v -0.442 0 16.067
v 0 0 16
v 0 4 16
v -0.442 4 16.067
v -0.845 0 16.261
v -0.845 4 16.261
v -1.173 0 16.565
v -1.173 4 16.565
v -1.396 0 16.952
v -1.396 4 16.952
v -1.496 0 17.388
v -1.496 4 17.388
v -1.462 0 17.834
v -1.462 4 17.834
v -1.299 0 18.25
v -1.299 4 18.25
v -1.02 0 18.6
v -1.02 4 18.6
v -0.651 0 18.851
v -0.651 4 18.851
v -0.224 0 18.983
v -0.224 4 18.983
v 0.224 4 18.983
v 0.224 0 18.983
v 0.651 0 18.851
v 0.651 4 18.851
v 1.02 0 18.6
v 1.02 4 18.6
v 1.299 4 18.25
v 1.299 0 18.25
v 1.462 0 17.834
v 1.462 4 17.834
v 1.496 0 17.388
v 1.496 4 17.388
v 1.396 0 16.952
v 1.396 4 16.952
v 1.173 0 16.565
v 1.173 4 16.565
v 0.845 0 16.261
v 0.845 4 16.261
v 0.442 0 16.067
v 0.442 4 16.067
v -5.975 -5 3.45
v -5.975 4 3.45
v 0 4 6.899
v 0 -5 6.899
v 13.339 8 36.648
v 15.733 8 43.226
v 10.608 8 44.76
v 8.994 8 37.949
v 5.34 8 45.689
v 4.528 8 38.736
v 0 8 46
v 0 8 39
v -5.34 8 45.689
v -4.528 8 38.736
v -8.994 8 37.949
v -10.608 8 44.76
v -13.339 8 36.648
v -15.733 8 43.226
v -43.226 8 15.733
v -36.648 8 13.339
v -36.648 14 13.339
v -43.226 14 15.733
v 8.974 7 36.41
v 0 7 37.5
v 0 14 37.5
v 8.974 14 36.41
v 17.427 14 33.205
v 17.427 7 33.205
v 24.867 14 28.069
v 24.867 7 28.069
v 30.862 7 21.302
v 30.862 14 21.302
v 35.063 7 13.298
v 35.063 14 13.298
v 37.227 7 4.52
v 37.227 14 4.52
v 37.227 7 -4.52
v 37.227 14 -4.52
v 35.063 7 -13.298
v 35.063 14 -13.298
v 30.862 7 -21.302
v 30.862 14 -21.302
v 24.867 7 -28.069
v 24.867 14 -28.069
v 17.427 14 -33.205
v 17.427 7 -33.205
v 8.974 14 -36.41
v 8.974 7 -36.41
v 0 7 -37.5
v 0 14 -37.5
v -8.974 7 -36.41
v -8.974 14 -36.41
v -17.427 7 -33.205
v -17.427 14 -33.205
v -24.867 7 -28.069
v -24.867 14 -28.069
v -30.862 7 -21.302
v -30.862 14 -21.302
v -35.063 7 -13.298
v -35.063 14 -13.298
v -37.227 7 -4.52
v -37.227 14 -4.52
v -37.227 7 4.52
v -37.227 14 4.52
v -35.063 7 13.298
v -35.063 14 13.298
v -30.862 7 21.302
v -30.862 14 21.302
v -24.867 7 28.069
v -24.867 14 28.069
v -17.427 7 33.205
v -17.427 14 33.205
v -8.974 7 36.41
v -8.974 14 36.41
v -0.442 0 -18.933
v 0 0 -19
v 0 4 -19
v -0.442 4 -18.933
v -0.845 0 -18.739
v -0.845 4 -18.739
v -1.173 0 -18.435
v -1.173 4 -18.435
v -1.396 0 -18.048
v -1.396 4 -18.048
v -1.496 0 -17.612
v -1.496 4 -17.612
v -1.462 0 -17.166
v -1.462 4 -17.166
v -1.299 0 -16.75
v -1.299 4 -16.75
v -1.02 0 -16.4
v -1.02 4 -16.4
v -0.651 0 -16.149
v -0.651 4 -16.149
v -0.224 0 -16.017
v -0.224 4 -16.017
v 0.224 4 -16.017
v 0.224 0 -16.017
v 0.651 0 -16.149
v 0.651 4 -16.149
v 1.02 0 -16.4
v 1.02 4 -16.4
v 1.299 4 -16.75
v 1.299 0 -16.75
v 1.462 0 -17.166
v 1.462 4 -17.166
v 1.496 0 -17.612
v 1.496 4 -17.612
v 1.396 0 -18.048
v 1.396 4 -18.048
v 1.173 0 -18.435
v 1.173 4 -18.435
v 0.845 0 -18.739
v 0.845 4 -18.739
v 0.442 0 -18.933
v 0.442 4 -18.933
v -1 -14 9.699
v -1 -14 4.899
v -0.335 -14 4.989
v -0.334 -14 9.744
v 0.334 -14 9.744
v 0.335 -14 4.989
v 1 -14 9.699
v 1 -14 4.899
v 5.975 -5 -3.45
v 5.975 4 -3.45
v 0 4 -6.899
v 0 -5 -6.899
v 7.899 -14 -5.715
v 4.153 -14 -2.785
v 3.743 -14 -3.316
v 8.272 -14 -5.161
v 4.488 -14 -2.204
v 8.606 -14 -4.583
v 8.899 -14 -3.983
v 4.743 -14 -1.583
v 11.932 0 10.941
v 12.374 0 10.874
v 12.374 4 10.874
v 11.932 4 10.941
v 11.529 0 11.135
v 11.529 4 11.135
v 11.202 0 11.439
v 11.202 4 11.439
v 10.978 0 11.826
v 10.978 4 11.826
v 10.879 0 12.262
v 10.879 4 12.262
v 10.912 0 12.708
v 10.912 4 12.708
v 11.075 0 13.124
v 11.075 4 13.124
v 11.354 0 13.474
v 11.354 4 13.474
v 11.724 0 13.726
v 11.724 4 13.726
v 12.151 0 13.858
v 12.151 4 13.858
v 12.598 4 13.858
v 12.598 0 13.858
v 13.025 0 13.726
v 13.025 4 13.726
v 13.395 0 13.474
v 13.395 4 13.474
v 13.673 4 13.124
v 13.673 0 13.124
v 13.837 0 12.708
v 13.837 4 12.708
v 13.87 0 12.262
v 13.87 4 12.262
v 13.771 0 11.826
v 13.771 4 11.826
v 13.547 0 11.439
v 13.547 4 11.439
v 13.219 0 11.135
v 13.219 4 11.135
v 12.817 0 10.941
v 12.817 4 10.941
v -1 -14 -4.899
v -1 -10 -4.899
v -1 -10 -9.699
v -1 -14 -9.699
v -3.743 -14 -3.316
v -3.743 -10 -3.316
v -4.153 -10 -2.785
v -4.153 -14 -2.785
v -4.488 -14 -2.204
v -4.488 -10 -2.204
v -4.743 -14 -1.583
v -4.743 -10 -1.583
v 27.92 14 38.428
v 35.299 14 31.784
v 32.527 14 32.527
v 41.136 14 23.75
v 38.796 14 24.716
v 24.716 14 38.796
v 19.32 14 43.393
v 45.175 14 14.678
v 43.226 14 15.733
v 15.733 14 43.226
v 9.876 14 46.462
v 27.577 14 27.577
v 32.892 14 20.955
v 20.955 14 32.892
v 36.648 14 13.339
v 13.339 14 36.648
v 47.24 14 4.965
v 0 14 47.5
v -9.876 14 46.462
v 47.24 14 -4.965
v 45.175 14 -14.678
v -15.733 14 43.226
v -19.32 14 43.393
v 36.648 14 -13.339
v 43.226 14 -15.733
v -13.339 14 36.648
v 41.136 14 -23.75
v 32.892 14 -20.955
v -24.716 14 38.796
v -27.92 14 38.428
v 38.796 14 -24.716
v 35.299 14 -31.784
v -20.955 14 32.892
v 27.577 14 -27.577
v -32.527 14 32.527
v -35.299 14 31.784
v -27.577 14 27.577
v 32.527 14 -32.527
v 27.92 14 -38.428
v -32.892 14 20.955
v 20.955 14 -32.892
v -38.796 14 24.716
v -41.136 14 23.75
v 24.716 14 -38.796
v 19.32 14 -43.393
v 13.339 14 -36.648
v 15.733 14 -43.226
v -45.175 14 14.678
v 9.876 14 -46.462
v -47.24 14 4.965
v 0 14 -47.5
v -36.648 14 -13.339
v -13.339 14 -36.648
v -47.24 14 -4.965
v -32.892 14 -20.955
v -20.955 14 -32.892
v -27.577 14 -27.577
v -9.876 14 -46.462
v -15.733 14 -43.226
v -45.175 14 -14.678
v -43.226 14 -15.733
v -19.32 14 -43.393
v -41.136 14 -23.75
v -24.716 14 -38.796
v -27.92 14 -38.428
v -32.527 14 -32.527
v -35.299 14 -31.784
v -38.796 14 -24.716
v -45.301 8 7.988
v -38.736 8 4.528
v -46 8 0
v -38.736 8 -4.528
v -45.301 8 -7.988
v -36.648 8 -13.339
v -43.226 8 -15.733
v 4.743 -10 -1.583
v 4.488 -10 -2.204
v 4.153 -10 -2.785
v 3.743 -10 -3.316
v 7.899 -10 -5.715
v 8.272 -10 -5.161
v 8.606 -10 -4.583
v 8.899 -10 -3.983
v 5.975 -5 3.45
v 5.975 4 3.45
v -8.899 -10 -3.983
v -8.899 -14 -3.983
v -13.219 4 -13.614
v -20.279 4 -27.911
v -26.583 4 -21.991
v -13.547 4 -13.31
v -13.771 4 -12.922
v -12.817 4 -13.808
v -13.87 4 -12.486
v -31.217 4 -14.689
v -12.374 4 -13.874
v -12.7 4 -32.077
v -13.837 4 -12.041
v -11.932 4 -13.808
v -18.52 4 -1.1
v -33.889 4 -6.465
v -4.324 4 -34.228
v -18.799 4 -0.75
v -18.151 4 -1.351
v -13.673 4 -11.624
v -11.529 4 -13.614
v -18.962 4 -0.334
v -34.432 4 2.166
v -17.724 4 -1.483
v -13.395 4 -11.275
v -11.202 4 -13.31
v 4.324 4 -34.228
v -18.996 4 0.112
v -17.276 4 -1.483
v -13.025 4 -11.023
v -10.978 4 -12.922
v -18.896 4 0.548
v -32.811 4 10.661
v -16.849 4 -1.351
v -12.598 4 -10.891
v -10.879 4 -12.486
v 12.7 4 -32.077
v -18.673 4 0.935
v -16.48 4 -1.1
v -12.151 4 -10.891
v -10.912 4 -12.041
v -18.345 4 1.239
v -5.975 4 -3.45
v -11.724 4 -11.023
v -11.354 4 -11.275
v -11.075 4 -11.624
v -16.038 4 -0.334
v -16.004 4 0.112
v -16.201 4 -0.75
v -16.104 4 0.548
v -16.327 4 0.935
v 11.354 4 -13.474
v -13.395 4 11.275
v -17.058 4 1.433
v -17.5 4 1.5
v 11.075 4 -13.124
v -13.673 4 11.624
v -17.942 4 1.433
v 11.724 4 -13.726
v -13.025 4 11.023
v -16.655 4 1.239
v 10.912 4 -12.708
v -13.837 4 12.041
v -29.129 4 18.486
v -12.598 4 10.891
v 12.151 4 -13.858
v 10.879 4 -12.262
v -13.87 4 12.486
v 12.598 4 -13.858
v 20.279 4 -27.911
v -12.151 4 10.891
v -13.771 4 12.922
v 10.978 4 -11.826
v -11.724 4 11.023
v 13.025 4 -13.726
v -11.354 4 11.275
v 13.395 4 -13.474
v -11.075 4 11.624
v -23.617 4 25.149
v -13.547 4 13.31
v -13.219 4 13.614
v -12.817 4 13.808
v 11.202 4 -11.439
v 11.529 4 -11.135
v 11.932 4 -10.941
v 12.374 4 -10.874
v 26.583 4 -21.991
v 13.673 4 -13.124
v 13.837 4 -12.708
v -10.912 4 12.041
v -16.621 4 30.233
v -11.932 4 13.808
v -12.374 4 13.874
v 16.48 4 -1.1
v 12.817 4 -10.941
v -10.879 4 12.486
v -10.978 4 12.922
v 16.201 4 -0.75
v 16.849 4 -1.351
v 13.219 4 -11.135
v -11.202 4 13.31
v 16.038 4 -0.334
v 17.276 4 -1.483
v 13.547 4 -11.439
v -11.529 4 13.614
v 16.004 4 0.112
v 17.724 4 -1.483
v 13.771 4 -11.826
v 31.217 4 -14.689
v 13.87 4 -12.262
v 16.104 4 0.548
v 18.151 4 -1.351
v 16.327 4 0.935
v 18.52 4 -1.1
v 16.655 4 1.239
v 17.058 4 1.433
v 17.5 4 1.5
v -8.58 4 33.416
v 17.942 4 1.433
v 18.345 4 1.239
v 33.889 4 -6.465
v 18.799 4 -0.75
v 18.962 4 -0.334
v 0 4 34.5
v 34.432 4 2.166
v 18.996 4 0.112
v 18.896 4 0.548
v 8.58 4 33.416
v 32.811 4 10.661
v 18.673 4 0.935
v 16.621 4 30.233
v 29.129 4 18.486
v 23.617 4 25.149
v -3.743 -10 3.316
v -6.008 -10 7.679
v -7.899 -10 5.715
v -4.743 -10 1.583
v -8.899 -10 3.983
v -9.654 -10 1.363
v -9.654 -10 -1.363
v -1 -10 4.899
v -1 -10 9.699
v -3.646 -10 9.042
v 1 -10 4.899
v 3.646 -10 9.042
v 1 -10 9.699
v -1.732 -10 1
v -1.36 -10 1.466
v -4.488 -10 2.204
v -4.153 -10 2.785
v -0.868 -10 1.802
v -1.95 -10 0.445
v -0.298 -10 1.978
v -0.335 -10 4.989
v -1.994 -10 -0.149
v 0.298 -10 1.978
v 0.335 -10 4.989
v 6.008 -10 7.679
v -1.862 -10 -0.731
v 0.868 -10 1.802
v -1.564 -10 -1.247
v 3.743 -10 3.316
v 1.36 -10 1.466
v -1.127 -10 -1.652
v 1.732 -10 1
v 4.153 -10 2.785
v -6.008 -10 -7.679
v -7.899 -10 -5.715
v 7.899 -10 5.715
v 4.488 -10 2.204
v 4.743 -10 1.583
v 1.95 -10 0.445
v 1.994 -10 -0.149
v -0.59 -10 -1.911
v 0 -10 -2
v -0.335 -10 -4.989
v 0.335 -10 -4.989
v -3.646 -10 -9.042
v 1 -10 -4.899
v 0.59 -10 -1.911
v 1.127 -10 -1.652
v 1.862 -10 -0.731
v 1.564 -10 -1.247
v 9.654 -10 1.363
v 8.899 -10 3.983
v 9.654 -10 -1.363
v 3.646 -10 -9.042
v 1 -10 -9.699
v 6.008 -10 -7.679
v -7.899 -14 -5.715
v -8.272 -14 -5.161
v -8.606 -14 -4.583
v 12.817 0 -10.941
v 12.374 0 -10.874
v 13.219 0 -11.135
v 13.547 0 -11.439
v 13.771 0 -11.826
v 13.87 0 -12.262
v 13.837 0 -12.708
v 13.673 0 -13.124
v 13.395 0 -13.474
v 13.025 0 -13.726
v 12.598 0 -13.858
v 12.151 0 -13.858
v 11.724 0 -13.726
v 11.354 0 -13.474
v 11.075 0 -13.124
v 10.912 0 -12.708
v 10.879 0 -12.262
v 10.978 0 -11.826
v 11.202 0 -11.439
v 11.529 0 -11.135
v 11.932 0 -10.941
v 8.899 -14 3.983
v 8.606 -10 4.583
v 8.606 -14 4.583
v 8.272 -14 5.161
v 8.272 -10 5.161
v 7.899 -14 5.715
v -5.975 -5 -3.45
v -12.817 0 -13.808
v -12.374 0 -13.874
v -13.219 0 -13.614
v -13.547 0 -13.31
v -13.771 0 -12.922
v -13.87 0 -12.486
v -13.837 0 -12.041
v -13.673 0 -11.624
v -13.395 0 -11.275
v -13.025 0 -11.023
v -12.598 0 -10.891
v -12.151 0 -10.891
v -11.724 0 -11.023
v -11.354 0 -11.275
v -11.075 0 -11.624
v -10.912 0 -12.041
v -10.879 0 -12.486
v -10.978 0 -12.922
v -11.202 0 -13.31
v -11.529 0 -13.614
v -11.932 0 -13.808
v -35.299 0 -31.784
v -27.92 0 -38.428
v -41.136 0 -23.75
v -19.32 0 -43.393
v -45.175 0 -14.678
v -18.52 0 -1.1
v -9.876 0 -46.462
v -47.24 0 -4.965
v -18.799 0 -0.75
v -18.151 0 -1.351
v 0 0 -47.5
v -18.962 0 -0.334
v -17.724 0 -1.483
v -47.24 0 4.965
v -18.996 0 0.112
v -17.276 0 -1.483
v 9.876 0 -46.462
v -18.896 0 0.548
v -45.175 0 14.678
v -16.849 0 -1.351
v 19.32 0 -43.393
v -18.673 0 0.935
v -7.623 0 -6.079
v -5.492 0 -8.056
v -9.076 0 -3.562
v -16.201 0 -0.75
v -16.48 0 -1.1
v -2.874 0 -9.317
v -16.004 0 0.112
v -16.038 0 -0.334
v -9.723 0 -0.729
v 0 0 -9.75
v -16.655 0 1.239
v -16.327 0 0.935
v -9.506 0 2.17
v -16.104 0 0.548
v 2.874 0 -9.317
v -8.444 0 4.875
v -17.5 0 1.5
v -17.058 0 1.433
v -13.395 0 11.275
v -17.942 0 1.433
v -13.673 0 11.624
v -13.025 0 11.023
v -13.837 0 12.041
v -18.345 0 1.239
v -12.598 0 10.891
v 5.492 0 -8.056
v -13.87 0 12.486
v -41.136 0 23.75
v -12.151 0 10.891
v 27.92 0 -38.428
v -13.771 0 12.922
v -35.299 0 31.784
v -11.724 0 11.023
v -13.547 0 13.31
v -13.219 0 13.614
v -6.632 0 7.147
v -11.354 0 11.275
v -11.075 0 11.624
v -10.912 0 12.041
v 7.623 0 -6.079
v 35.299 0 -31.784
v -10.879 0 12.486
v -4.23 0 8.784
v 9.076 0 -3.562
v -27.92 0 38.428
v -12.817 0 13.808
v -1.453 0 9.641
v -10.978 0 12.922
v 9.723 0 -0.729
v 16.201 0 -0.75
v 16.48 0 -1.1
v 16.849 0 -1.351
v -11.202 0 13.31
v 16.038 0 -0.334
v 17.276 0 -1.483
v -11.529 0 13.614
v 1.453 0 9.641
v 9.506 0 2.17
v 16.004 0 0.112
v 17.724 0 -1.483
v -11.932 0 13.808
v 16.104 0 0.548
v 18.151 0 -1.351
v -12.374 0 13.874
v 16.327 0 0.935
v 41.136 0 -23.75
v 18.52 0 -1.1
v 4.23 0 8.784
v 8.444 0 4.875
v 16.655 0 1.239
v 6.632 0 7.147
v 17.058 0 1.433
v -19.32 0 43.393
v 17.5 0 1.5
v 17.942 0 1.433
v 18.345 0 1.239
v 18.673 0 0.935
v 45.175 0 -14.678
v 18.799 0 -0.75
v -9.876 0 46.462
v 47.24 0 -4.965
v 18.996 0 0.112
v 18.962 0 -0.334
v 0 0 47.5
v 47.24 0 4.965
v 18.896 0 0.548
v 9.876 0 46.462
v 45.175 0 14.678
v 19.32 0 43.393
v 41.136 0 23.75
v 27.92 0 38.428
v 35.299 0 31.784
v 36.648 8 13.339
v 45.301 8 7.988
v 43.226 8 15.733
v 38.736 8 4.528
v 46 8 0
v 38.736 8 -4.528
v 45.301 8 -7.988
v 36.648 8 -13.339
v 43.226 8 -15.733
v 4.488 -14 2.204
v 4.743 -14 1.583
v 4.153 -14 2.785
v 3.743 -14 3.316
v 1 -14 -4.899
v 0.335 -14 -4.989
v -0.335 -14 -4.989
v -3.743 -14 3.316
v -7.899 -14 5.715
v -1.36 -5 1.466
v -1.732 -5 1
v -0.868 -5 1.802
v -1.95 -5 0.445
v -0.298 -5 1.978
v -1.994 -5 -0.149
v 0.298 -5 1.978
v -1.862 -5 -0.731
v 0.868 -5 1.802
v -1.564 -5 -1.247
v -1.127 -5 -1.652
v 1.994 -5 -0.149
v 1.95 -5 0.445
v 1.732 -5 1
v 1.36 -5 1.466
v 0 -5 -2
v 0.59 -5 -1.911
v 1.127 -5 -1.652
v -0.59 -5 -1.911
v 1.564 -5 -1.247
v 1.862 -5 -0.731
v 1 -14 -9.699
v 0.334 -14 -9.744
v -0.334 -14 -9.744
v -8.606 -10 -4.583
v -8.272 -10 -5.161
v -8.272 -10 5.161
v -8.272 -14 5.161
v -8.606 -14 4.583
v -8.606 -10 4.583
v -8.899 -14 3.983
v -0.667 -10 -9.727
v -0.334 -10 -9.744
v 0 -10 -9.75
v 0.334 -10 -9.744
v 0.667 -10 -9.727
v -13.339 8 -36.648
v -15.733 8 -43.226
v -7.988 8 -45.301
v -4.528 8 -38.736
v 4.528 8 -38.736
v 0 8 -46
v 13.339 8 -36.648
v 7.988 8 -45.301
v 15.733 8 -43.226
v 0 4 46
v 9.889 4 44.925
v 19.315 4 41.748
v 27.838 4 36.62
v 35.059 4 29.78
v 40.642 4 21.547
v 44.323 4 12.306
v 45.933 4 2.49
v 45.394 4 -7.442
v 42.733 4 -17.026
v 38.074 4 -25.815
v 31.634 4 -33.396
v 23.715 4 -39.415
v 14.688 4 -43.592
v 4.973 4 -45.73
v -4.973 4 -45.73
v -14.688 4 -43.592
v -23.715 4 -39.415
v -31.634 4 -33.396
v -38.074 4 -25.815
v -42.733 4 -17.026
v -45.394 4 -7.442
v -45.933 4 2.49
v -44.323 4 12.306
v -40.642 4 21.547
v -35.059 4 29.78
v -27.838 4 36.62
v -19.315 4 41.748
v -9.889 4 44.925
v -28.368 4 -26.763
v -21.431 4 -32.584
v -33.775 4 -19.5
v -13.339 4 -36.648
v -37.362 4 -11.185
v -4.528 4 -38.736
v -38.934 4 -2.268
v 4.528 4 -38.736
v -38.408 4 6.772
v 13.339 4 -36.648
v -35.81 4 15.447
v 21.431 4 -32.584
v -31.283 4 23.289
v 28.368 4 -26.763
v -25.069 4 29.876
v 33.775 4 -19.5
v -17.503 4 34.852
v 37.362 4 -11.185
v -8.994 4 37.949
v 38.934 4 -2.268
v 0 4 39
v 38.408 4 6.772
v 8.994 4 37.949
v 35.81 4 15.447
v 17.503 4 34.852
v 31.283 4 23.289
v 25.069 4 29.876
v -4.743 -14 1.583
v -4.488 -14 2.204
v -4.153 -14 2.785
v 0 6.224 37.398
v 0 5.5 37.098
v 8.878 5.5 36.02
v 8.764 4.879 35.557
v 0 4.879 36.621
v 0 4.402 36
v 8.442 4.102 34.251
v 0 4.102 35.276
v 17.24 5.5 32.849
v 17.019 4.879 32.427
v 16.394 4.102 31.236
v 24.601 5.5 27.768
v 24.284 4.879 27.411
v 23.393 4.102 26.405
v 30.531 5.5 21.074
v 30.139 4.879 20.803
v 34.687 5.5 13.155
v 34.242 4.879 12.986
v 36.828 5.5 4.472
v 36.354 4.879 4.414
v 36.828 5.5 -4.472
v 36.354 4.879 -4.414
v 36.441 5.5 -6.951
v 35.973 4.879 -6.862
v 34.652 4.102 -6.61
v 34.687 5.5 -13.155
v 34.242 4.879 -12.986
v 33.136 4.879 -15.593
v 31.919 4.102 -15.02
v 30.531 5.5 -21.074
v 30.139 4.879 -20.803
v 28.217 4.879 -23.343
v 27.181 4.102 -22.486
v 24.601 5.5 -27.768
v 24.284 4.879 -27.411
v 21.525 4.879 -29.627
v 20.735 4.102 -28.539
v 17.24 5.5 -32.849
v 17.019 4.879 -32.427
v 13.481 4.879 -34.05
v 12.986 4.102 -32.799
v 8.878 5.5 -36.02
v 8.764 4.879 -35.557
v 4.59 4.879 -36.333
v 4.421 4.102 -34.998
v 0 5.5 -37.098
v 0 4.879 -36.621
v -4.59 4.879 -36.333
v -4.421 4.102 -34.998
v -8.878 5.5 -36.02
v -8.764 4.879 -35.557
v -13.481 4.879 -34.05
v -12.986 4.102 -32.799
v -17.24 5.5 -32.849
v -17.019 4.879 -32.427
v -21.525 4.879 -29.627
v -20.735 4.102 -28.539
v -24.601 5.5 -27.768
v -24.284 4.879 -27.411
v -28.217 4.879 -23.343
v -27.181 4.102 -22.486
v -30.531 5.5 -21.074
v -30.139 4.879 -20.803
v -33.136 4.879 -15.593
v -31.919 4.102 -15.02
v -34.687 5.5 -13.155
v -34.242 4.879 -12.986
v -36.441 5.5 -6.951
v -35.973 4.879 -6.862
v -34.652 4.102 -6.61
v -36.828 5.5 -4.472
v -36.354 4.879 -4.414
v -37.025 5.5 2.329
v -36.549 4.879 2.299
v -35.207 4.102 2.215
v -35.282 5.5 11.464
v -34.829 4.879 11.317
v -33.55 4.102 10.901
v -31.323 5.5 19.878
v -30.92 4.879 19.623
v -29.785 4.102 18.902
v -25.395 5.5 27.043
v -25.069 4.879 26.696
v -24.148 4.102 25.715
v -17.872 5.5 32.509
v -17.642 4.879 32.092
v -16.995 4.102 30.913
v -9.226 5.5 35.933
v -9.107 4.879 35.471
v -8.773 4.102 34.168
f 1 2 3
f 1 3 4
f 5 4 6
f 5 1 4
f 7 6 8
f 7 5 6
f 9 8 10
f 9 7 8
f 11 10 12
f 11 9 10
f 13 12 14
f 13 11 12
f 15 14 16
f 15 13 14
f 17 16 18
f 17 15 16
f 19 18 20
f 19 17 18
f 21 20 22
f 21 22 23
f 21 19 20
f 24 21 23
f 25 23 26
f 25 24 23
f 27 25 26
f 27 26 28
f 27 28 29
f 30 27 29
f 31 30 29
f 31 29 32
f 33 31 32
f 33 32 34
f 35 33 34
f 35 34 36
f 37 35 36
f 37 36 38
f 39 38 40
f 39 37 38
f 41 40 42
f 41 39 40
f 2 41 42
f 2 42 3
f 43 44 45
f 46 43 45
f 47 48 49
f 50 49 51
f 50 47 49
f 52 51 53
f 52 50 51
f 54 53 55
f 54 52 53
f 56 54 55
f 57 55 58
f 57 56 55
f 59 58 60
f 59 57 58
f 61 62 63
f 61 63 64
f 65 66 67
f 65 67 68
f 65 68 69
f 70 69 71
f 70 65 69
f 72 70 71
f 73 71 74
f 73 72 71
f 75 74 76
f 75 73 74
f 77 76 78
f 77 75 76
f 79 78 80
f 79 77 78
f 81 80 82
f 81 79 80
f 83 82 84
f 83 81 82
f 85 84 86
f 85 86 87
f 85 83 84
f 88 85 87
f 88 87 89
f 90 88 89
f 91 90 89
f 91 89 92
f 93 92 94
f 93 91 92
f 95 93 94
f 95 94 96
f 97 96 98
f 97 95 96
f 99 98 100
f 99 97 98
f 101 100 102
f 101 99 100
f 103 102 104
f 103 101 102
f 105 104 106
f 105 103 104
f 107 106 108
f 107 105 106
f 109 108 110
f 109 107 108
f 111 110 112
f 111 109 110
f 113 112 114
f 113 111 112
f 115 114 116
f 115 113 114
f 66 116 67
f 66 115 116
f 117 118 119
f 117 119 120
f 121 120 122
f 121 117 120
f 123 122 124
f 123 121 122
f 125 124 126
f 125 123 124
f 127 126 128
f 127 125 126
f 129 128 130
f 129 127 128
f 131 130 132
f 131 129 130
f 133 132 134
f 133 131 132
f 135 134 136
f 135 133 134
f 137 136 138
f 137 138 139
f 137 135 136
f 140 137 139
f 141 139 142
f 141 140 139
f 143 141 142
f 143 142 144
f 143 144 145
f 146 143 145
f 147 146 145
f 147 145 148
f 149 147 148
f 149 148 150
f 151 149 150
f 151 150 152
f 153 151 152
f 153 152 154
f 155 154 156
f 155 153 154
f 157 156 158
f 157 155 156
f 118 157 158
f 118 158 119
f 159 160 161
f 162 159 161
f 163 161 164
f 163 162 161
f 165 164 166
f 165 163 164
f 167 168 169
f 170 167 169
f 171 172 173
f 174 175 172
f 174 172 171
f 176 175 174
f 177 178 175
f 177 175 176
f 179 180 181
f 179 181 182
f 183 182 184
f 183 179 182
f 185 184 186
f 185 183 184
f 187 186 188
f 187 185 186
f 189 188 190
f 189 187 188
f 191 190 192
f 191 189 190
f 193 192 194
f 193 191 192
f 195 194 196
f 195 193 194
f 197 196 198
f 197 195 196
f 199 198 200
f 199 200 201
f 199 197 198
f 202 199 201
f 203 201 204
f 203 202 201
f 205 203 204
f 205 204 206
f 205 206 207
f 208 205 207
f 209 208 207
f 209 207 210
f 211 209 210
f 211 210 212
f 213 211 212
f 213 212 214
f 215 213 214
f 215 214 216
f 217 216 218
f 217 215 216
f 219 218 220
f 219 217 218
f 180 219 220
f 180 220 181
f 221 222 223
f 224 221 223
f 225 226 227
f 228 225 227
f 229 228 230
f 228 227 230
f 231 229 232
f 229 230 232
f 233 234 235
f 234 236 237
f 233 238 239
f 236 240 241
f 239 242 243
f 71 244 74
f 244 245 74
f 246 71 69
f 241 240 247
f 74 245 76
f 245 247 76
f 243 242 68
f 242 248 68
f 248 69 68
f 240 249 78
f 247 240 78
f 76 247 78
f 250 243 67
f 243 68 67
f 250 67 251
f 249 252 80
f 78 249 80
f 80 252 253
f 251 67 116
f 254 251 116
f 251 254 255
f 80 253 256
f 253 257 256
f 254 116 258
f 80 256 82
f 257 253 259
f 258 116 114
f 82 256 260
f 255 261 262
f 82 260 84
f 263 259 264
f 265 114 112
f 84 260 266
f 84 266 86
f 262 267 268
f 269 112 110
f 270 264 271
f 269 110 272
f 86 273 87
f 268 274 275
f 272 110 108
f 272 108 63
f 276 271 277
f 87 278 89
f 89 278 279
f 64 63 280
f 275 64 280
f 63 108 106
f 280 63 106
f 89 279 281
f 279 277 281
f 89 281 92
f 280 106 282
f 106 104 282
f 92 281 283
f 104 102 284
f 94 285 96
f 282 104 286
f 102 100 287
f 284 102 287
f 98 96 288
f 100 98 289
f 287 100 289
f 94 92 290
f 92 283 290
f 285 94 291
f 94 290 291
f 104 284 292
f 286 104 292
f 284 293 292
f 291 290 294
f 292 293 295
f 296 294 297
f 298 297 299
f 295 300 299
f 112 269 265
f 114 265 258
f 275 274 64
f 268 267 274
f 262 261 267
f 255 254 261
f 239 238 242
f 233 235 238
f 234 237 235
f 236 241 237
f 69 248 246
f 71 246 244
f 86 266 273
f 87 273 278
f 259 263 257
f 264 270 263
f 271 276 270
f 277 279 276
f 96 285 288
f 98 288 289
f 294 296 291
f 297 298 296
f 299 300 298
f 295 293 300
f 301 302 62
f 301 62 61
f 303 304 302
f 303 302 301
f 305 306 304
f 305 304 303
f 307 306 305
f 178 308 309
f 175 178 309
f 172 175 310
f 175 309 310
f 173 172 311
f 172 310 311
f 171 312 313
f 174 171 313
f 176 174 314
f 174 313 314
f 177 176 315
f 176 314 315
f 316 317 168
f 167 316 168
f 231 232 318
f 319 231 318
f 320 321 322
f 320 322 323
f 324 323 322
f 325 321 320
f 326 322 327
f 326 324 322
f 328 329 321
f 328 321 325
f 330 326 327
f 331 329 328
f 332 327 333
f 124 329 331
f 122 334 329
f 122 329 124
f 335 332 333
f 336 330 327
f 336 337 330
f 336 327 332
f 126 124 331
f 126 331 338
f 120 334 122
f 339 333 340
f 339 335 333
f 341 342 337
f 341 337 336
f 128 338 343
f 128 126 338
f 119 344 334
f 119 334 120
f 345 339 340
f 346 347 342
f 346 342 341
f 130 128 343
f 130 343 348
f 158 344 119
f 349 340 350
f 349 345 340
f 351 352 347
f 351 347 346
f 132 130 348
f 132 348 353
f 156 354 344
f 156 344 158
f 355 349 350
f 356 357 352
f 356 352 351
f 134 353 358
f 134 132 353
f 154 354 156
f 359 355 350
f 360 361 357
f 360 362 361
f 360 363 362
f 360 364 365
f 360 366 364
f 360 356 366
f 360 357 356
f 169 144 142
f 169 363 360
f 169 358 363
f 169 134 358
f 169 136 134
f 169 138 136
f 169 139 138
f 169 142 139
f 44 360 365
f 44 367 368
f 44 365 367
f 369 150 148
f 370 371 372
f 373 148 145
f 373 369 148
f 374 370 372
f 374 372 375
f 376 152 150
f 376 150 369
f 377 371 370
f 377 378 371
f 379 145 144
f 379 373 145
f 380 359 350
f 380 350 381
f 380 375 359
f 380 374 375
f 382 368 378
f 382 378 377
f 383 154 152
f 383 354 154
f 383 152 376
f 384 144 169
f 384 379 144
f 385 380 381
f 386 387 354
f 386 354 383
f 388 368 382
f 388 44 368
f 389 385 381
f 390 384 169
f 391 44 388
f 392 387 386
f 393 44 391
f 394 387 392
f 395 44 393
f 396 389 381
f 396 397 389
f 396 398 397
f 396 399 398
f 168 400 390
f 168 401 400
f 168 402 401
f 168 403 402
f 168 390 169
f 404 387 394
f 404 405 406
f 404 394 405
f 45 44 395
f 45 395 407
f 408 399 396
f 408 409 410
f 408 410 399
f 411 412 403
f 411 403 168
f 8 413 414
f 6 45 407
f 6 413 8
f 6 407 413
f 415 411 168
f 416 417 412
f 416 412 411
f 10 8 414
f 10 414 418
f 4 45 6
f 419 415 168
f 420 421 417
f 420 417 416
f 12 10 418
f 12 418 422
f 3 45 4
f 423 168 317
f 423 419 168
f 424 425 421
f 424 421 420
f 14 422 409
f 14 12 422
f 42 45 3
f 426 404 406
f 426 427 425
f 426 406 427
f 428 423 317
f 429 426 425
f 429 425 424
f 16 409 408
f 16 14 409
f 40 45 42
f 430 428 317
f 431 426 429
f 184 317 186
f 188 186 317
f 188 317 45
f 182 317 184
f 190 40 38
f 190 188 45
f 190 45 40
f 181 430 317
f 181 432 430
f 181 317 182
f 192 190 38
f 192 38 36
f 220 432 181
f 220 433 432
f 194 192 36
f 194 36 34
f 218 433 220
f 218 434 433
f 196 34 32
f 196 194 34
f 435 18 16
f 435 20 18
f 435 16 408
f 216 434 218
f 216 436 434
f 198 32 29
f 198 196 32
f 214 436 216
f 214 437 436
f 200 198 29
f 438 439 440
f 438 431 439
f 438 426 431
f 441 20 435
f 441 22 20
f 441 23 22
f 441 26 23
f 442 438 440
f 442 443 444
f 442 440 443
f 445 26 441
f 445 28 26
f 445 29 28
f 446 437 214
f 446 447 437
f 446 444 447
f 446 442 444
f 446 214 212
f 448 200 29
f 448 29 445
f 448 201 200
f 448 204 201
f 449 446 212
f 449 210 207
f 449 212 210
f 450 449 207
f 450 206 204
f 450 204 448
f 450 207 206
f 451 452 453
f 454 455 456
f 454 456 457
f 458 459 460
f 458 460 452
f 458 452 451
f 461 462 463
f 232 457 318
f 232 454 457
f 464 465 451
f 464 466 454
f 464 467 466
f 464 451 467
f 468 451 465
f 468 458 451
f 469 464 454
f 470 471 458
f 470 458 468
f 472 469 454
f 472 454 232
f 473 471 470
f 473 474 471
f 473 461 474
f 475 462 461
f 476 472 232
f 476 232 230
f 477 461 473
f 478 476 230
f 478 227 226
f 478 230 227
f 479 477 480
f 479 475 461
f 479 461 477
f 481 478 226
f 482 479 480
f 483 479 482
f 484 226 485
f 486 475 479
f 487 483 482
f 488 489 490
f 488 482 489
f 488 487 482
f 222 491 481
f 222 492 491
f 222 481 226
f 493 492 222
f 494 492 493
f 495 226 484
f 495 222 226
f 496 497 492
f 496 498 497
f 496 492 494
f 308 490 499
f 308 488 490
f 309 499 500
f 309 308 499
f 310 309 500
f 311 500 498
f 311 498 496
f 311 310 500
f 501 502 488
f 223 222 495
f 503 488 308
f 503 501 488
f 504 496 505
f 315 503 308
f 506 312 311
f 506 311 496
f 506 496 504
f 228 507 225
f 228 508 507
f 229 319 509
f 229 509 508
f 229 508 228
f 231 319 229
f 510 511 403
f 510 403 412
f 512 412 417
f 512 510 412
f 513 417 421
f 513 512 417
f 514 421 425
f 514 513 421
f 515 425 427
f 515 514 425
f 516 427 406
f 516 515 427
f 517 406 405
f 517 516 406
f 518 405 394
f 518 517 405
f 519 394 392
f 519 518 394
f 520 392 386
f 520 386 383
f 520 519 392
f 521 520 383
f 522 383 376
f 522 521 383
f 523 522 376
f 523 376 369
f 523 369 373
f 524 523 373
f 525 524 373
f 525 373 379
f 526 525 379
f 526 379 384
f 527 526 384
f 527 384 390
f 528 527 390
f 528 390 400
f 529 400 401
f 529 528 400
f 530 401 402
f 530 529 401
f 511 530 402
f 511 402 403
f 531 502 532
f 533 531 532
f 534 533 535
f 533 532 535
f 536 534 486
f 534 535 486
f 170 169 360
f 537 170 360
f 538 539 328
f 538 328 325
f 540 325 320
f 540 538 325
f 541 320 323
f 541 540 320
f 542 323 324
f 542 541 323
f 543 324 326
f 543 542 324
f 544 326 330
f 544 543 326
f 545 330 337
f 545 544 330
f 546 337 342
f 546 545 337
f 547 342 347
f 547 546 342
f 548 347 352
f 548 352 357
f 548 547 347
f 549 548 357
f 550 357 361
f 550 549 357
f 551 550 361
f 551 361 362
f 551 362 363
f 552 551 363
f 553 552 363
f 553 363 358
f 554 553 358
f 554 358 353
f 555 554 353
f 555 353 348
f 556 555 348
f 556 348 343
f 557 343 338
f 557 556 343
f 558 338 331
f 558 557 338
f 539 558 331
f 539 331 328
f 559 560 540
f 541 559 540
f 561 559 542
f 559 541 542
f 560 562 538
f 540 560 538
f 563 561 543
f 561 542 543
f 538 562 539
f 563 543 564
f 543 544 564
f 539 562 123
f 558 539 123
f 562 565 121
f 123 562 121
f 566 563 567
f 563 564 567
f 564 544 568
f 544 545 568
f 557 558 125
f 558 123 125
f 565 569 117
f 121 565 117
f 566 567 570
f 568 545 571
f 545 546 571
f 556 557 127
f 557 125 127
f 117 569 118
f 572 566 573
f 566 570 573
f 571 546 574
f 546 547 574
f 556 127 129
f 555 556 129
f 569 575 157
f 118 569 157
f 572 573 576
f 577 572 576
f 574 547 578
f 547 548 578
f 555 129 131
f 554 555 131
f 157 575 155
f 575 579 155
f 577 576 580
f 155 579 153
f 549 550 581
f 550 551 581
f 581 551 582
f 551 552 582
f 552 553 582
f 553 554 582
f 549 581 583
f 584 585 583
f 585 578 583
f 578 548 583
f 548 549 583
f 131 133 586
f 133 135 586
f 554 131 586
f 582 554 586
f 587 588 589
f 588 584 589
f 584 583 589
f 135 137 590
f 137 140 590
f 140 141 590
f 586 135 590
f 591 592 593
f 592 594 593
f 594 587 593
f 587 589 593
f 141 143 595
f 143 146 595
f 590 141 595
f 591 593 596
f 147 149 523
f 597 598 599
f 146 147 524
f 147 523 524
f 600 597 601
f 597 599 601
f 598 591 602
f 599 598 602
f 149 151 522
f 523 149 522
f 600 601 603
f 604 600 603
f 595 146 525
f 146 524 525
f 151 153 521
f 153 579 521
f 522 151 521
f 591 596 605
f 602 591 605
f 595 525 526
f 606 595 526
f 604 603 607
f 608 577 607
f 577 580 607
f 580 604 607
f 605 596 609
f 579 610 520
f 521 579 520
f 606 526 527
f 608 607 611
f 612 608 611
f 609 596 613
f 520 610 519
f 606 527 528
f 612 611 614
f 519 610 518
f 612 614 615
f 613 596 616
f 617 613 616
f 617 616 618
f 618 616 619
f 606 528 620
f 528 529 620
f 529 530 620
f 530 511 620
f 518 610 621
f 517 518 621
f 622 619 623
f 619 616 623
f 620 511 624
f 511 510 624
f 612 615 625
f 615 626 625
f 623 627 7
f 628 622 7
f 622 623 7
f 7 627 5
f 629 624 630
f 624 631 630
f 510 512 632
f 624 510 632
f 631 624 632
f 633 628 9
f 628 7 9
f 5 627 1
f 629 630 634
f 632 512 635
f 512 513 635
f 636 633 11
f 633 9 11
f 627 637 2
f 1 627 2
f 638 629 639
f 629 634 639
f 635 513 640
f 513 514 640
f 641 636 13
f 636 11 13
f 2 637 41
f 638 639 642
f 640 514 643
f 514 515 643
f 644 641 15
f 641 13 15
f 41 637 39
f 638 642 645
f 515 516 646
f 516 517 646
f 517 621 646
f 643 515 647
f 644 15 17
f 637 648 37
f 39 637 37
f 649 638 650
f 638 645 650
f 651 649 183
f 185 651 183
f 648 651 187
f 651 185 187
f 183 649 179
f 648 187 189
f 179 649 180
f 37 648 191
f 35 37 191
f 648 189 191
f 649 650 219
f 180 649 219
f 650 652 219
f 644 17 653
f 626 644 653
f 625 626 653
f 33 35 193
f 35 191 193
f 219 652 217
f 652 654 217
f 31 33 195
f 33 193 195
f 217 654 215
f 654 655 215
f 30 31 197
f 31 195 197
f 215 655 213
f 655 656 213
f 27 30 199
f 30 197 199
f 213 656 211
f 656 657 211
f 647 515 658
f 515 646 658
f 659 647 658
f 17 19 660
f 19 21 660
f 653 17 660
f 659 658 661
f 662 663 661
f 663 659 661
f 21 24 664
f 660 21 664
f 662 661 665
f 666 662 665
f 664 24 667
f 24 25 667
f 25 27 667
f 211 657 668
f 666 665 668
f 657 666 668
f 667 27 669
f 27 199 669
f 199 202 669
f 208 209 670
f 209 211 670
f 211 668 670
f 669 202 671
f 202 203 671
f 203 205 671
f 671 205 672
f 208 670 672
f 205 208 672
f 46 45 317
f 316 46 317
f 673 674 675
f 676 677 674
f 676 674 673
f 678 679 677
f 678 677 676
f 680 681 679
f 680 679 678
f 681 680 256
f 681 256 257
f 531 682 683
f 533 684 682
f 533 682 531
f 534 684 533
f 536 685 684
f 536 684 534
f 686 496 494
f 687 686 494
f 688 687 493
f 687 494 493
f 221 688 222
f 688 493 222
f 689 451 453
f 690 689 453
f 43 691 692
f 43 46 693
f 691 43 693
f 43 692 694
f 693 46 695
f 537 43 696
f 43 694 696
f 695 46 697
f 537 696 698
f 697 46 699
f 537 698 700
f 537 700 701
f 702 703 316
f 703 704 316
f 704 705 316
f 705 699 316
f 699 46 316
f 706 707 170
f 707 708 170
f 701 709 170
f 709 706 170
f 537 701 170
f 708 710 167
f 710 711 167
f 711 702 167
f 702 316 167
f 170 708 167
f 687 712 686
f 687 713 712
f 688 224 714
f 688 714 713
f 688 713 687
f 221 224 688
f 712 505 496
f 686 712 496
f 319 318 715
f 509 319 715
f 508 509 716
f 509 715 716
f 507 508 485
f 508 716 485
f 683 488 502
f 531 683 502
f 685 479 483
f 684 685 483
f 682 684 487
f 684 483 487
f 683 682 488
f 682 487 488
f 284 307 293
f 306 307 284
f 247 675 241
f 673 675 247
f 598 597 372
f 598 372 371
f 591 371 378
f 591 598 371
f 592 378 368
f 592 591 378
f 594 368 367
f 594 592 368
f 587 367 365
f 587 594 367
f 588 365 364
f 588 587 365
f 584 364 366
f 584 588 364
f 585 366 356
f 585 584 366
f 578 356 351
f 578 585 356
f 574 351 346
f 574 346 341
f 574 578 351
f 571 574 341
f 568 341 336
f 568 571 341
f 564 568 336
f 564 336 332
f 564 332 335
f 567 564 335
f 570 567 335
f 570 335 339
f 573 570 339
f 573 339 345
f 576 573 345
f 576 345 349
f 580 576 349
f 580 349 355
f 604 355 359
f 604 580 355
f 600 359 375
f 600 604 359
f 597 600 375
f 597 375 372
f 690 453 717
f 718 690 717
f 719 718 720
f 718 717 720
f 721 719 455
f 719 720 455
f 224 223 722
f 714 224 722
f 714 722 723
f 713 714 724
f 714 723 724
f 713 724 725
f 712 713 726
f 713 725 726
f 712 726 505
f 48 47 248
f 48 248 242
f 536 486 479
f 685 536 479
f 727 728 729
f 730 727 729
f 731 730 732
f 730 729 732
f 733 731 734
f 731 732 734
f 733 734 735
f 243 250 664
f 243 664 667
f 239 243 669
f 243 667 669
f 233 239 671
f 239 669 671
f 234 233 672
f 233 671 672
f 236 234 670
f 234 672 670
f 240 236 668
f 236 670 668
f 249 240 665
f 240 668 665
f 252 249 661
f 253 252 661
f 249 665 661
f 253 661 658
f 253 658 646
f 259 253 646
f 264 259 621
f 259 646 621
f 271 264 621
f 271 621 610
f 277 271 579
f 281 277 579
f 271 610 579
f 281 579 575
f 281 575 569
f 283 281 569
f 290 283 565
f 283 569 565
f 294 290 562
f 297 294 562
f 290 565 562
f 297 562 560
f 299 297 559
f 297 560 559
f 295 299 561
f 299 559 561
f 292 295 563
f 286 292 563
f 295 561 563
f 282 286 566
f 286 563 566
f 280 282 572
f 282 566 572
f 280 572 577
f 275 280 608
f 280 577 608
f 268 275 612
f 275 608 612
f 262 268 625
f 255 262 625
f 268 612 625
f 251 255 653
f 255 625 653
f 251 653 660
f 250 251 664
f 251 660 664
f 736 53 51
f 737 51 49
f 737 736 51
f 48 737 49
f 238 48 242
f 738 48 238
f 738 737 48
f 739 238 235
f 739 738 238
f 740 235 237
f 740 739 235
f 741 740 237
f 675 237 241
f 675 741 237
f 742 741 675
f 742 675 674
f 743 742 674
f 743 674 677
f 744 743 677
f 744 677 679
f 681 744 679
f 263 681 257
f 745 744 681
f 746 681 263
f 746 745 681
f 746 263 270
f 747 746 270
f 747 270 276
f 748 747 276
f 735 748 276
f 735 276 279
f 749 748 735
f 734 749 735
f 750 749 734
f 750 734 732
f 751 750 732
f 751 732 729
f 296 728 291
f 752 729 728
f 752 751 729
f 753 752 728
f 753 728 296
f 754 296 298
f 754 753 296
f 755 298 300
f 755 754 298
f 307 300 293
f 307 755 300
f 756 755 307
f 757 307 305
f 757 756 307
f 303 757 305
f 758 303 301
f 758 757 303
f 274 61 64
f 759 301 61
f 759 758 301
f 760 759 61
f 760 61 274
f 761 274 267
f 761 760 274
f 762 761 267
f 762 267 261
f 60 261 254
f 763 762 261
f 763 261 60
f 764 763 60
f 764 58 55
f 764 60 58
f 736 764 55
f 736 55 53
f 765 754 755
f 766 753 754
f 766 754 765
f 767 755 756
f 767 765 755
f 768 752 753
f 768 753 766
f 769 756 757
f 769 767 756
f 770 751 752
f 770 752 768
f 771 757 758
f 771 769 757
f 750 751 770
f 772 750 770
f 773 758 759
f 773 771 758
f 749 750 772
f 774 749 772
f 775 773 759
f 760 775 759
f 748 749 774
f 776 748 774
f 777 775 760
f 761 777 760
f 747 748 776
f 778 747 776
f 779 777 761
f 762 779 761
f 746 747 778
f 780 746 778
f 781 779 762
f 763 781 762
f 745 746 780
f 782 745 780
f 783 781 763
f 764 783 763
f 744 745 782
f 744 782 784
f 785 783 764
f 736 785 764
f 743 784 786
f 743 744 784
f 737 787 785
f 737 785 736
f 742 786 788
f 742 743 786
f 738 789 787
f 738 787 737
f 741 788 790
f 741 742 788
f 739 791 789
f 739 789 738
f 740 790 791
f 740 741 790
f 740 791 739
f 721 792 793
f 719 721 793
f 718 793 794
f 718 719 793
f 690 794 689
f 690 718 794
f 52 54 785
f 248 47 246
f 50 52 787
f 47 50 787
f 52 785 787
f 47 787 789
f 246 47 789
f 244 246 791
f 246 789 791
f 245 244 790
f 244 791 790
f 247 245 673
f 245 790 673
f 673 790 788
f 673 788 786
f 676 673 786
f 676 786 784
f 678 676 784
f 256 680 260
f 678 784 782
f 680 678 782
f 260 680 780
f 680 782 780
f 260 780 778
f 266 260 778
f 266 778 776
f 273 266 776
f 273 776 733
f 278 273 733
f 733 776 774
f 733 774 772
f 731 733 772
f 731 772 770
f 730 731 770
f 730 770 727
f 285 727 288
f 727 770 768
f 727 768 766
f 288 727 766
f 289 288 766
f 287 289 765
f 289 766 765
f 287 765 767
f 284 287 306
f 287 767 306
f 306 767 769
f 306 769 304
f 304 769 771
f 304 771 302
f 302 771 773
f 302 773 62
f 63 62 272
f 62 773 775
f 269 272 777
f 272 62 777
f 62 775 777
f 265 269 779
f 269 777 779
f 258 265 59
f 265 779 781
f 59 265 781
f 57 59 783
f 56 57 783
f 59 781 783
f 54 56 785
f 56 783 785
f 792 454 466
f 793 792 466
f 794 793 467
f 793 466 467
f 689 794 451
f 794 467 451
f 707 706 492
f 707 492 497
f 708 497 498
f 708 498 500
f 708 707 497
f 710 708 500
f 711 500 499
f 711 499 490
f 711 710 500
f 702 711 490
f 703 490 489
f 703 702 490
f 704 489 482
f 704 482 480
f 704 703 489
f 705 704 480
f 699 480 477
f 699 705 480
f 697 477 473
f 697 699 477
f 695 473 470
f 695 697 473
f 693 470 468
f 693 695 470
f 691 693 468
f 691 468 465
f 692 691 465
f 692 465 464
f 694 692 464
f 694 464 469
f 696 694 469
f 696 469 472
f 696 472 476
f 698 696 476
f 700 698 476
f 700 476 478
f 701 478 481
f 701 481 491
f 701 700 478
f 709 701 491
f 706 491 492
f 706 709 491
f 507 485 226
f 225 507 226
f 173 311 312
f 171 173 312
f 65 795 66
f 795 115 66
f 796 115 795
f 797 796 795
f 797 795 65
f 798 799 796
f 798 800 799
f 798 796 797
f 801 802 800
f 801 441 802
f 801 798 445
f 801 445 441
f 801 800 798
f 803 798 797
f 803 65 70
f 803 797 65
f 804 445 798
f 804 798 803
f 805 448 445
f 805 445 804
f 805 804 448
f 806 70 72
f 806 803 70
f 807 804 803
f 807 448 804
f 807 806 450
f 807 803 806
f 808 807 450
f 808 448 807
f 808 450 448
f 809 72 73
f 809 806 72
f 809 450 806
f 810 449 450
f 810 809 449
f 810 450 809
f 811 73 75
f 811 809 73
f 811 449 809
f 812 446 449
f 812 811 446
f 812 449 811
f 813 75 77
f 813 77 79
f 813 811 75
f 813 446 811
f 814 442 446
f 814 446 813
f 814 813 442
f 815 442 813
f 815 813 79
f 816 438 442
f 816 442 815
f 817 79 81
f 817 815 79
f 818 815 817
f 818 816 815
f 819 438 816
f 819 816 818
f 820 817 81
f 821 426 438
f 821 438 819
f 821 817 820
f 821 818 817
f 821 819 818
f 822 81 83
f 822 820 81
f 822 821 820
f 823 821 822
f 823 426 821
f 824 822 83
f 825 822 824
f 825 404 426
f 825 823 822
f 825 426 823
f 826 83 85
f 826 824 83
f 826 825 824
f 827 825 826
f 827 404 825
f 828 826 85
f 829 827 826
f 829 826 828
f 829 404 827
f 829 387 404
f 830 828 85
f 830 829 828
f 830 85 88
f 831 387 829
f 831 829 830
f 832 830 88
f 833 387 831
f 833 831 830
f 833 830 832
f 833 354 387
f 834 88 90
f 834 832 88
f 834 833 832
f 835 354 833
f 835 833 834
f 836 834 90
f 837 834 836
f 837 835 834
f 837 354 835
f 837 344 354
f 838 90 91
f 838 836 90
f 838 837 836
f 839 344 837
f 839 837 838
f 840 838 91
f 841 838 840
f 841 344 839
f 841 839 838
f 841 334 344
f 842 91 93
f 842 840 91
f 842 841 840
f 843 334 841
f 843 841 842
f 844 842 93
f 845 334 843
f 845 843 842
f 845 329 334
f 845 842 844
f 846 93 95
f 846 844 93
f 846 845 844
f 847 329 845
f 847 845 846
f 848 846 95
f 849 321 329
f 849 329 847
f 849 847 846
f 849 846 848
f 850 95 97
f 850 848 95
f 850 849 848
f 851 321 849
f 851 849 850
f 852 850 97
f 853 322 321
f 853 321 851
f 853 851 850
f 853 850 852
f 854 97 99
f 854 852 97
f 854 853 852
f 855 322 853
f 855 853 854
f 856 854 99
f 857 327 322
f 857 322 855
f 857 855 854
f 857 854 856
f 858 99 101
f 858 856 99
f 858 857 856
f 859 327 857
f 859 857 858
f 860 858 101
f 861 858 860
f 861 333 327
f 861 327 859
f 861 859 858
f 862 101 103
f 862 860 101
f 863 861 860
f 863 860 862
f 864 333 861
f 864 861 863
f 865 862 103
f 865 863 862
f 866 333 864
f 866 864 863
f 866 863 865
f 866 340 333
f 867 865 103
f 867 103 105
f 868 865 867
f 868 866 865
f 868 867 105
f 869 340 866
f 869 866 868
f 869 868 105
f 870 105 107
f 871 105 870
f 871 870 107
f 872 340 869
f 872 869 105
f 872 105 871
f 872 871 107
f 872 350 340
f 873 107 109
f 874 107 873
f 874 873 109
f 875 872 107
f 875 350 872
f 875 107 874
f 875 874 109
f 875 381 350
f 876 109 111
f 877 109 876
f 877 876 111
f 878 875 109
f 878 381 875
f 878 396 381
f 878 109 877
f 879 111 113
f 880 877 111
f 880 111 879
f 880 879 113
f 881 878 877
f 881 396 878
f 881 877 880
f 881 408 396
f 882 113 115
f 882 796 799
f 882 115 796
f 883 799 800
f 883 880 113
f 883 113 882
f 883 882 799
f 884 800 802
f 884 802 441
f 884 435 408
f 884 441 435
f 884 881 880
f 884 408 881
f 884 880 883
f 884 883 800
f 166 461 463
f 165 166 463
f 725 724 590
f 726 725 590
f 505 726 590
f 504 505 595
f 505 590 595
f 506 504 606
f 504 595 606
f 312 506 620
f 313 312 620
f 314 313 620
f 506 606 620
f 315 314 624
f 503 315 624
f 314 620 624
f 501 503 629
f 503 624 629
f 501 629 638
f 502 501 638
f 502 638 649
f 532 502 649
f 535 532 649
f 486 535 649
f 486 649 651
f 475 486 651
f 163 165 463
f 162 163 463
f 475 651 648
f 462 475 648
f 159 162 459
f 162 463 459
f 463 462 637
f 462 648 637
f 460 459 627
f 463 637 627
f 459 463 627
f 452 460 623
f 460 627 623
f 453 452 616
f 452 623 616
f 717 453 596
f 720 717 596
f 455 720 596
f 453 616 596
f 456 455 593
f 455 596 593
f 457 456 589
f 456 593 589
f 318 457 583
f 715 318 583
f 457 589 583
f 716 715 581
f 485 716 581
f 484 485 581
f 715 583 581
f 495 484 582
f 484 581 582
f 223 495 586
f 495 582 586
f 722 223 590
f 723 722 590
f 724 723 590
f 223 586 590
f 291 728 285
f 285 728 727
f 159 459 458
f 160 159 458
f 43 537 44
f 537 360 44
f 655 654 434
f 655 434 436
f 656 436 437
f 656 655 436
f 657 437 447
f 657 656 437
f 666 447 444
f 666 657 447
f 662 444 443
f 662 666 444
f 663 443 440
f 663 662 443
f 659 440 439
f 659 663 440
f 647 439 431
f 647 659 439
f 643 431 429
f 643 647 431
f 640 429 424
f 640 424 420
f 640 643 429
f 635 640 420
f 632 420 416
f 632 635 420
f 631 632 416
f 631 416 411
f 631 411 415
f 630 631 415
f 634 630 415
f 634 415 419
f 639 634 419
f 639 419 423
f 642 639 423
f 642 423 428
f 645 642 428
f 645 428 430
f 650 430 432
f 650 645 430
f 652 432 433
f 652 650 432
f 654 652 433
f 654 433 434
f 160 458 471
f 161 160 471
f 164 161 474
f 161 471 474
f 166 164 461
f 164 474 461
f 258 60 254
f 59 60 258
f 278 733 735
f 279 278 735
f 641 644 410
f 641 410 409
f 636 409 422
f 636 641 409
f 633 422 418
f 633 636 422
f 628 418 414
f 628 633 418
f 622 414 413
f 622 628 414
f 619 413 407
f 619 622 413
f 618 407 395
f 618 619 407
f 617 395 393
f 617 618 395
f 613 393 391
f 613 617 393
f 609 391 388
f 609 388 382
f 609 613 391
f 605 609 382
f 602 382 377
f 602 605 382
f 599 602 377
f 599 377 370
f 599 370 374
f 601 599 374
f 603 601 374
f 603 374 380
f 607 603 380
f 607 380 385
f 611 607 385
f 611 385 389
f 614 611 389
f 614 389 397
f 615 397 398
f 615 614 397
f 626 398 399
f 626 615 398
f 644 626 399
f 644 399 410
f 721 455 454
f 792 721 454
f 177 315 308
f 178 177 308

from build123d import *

# Parameters (mm, degrees)
SKETCH_1_R               = 21.5
SKETCH_1_R_2             = 1.5
EXTRUDE_1_DEPTH          = 4
SKETCH_9_R               = 9.75
EXTRUDE_4_DEPTH          = 5
SKETCH_10_R              = 9.75
SKETCH_10_R_2            = 2
EXTRUDE_5_DEPTH          = 5
EXTRUDE_6_DEPTH          = 4
PATTERN_CIRCULAR_1_COUNT = 2
PATTERN_CIRCULAR_1_ANGLE = 60
EXTRUDE_START            = -4
SKETCH_12_R              = 47.5
SKETCH_12_R_2            = 21.5
EXTRUDE_7_DEPTH          = 4
SKETCH_13_R              = 47.5
SKETCH_13_R_2            = 46
SKETCH_13_R_3            = 39
SKETCH_13_R_4            = 37.5
EXTRUDE_8_DEPTH          = 10
EXTRUDE_START_2          = -6
EXTRUDE_9_DEPTH          = 6
FILLET_1_R               = 3


with BuildPart() as part:
    # 草图1 → 凸台-拉伸1 (new body)
    with BuildSketch(Plane(origin=(0, 0, 0), x_dir=(1, 0, 0), z_dir=(0, 1, 0))):
        with Locations(Location((0, 0, 0), (0, 0, 270))):
            Circle(SKETCH_1_R)
        with Locations(Location((12.374368671, 12.374368671, 0), (0, 0, 270))):
            Circle(SKETCH_1_R_2, mode=Mode.SUBTRACT)
        with Locations(Location((12.374368671, -12.374368671, 0), (0, 0, 90))):
            Circle(SKETCH_1_R_2, mode=Mode.SUBTRACT)
        with Locations(Location((-12.374368671, -12.374368671, 0), (0, 0, 270))):
            Circle(SKETCH_1_R_2, mode=Mode.SUBTRACT)
        with Locations(Location((-12.374368671, 12.374368671, 0), (0, 0, 90))):
            Circle(SKETCH_1_R_2, mode=Mode.SUBTRACT)
        with Locations(Location((0, 17.5, 0), (0, 0, 90))):
            Circle(SKETCH_1_R_2, mode=Mode.SUBTRACT)
        with Locations(Location((17.5, 0, 0), (0, 0, 270))):
            Circle(SKETCH_1_R_2, mode=Mode.SUBTRACT)
        with Locations(Location((0, -17.5, 0), (0, 0, 90))):
            Circle(SKETCH_1_R_2, mode=Mode.SUBTRACT)
        with Locations(Location((-17.5, 0, 0), (0, 0, 270))):
            Circle(SKETCH_1_R_2, mode=Mode.SUBTRACT)
        Polygon((0, 6.899335717), (-5.975, 3.449667858), (-5.975, -3.449667858), (0, -6.899335717), (5.975, -3.449667858), (5.975, 3.449667858), align=None, mode=Mode.SUBTRACT)
    extrude(amount=EXTRUDE_1_DEPTH)

    # 草图9 → 凸台-拉伸4 (add)
    with BuildSketch(Plane.XZ):
        with Locations(Location((0, 0, 0), (0, 0, 270))):
            Circle(SKETCH_9_R)
        Polygon((-5.975, -3.449667858), (-5.975, 3.449667858), (0, 6.899335717), (5.975, 3.449667858), (5.975, -3.449667858), (0, -6.899335717), align=None, mode=Mode.SUBTRACT)
    extrude(amount=EXTRUDE_4_DEPTH)

    # 草图10 → 凸台-拉伸5 (add)
    with BuildSketch(Plane.XZ.offset(5)):
        with Locations(Location((0, 0, 0), (0, 0, 270))):
            Circle(SKETCH_10_R)
        with Locations(Location((0, 0, 0), (0, 0, 270))):
            Circle(SKETCH_10_R_2, mode=Mode.SUBTRACT)
    extrude(amount=EXTRUDE_5_DEPTH)

    # 草图11 → 凸台-拉伸6 (add)
    with BuildSketch(Plane.XZ.offset(10)):
        with BuildLine():
            Line((-7.899218714, -5.715316589), (-3.742640687, -3.315515147))
            ThreePointArc((-3.742640687, -3.315515147), (-4.330127019, -2.5), (-4.742640687, -1.583464339))
            Line((-4.742640687, -1.583464339), (-8.899218714, -3.983265782))
            ThreePointArc((-8.899218714, -3.983265782), (-8.443747687, -4.875), (-7.899218714, -5.715316589))
        make_face()
        with BuildLine():
            ThreePointArc((-1, 4.898979486), (0, 5), (1, 4.898979486))
            Line((1, 4.898979486), (1, 9.698582371))
            ThreePointArc((1, 9.698582371), (0, 9.75), (-1, 9.698582371))
            Line((-1, 9.698582371), (-1, 4.898979486))
        make_face()
        with BuildLine():
            Line((8.899218714, -3.983265782), (4.742640687, -1.583464339))
            ThreePointArc((4.742640687, -1.583464339), (4.330127019, -2.5), (3.742640687, -3.315515147))
            Line((3.742640687, -3.315515147), (7.899218714, -5.715316589))
            ThreePointArc((7.899218714, -5.715316589), (8.443747687, -4.875), (8.899218714, -3.983265782))
        make_face()
    extrude_6 = extrude(amount=EXTRUDE_6_DEPTH)

    # 阵列(圆周)1: 凸台-拉伸6 ×2 about axis
    pattern_circular_1_axis = Axis((0, 0, 0), (0, -1, 0))
    for i in range(1, PATTERN_CIRCULAR_1_COUNT):
        add(extrude_6.rotate(pattern_circular_1_axis, i * PATTERN_CIRCULAR_1_ANGLE / (PATTERN_CIRCULAR_1_COUNT - 1)))

    # 草图12 → 凸台-拉伸7 (add)
    with BuildSketch(Plane(origin=(0, 4, 0), x_dir=(1, 0, 0), z_dir=(0, 1, 0)).offset(EXTRUDE_START)):
        with Locations(Location((0, 0, 0), (0, 0, 270))):
            Circle(SKETCH_12_R)
        Circle(SKETCH_12_R_2, mode=Mode.SUBTRACT)
    extrude(amount=EXTRUDE_7_DEPTH)

    # 草图13 → 凸台-拉伸8 (add)
    # profile 1 of 2: a face of its own
    with BuildSketch(Plane(origin=(0, 4, 0), x_dir=(1, 0, 0), z_dir=(0, 1, 0))):
        with Locations(Location((0, 0, 0), (0, 0, 270))):
            Circle(SKETCH_13_R)
        with Locations(Location((0, 0, 0), (0, 0, 270))):
            Circle(SKETCH_13_R_2, mode=Mode.SUBTRACT)
    # profile 2 of 2: a face of its own
    with BuildSketch(Plane(origin=(0, 4, 0), x_dir=(1, 0, 0), z_dir=(0, 1, 0))):
        with Locations(Location((0, 0, 0), (0, 0, 270))):
            Circle(SKETCH_13_R_3)
        with Locations(Location((0, 0, 0), (0, 0, 270))):
            Circle(SKETCH_13_R_4, mode=Mode.SUBTRACT)
    extrude(amount=EXTRUDE_8_DEPTH)

    # 草图14 → 凸台-拉伸9 (add)
    with BuildSketch(Plane(origin=(0, 14, 0), x_dir=(1, 0, 0), z_dir=(0, 1, 0)).offset(EXTRUDE_START_2)):
        with BuildLine():
            Line((-15.732926593, 43.225860556), (-13.33878559, 36.648012211))
            ThreePointArc((-13.33878559, 36.648012211), (0, 39), (13.33878559, 36.648012211))
            Line((13.33878559, 36.648012211), (15.732926593, 43.225860556))
            ThreePointArc((15.732926593, 43.225860556), (0, 46), (-15.732926593, 43.225860556))
        make_face()
        with BuildLine():
            Line((43.225860556, -15.732926593), (36.648012211, -13.33878559))
            ThreePointArc((36.648012211, -13.33878559), (39, 0), (36.648012211, 13.33878559))
            Line((36.648012211, 13.33878559), (43.225860556, 15.732926593))
            ThreePointArc((43.225860556, 15.732926593), (46, 0), (43.225860556, -15.732926593))
        make_face()
        with BuildLine():
            Line((-15.732926593, -43.225860556), (-13.33878559, -36.648012211))
            ThreePointArc((-13.33878559, -36.648012211), (0, -39), (13.33878559, -36.648012211))
            Line((13.33878559, -36.648012211), (15.732926593, -43.225860556))
            ThreePointArc((15.732926593, -43.225860556), (0, -46), (-15.732926593, -43.225860556))
        make_face()
        with BuildLine():
            Line((-43.225860556, 15.732926593), (-36.648012211, 13.33878559))
            ThreePointArc((-36.648012211, 13.33878559), (-39, 0), (-36.648012211, -13.33878559))
            Line((-36.648012211, -13.33878559), (-43.225860556, -15.732926593))
            ThreePointArc((-43.225860556, -15.732926593), (-46, 0), (-43.225860556, 15.732926593))
        make_face()
    extrude(amount=EXTRUDE_9_DEPTH)

    # 圆角1
    fillet_1_edges = [part.edges().sort_by_distance(p)[0] for p in [
        (0, 4, -37.5),
    ]]
    fillet(fillet_1_edges, radius=FILLET_1_R)


solid = part.part
